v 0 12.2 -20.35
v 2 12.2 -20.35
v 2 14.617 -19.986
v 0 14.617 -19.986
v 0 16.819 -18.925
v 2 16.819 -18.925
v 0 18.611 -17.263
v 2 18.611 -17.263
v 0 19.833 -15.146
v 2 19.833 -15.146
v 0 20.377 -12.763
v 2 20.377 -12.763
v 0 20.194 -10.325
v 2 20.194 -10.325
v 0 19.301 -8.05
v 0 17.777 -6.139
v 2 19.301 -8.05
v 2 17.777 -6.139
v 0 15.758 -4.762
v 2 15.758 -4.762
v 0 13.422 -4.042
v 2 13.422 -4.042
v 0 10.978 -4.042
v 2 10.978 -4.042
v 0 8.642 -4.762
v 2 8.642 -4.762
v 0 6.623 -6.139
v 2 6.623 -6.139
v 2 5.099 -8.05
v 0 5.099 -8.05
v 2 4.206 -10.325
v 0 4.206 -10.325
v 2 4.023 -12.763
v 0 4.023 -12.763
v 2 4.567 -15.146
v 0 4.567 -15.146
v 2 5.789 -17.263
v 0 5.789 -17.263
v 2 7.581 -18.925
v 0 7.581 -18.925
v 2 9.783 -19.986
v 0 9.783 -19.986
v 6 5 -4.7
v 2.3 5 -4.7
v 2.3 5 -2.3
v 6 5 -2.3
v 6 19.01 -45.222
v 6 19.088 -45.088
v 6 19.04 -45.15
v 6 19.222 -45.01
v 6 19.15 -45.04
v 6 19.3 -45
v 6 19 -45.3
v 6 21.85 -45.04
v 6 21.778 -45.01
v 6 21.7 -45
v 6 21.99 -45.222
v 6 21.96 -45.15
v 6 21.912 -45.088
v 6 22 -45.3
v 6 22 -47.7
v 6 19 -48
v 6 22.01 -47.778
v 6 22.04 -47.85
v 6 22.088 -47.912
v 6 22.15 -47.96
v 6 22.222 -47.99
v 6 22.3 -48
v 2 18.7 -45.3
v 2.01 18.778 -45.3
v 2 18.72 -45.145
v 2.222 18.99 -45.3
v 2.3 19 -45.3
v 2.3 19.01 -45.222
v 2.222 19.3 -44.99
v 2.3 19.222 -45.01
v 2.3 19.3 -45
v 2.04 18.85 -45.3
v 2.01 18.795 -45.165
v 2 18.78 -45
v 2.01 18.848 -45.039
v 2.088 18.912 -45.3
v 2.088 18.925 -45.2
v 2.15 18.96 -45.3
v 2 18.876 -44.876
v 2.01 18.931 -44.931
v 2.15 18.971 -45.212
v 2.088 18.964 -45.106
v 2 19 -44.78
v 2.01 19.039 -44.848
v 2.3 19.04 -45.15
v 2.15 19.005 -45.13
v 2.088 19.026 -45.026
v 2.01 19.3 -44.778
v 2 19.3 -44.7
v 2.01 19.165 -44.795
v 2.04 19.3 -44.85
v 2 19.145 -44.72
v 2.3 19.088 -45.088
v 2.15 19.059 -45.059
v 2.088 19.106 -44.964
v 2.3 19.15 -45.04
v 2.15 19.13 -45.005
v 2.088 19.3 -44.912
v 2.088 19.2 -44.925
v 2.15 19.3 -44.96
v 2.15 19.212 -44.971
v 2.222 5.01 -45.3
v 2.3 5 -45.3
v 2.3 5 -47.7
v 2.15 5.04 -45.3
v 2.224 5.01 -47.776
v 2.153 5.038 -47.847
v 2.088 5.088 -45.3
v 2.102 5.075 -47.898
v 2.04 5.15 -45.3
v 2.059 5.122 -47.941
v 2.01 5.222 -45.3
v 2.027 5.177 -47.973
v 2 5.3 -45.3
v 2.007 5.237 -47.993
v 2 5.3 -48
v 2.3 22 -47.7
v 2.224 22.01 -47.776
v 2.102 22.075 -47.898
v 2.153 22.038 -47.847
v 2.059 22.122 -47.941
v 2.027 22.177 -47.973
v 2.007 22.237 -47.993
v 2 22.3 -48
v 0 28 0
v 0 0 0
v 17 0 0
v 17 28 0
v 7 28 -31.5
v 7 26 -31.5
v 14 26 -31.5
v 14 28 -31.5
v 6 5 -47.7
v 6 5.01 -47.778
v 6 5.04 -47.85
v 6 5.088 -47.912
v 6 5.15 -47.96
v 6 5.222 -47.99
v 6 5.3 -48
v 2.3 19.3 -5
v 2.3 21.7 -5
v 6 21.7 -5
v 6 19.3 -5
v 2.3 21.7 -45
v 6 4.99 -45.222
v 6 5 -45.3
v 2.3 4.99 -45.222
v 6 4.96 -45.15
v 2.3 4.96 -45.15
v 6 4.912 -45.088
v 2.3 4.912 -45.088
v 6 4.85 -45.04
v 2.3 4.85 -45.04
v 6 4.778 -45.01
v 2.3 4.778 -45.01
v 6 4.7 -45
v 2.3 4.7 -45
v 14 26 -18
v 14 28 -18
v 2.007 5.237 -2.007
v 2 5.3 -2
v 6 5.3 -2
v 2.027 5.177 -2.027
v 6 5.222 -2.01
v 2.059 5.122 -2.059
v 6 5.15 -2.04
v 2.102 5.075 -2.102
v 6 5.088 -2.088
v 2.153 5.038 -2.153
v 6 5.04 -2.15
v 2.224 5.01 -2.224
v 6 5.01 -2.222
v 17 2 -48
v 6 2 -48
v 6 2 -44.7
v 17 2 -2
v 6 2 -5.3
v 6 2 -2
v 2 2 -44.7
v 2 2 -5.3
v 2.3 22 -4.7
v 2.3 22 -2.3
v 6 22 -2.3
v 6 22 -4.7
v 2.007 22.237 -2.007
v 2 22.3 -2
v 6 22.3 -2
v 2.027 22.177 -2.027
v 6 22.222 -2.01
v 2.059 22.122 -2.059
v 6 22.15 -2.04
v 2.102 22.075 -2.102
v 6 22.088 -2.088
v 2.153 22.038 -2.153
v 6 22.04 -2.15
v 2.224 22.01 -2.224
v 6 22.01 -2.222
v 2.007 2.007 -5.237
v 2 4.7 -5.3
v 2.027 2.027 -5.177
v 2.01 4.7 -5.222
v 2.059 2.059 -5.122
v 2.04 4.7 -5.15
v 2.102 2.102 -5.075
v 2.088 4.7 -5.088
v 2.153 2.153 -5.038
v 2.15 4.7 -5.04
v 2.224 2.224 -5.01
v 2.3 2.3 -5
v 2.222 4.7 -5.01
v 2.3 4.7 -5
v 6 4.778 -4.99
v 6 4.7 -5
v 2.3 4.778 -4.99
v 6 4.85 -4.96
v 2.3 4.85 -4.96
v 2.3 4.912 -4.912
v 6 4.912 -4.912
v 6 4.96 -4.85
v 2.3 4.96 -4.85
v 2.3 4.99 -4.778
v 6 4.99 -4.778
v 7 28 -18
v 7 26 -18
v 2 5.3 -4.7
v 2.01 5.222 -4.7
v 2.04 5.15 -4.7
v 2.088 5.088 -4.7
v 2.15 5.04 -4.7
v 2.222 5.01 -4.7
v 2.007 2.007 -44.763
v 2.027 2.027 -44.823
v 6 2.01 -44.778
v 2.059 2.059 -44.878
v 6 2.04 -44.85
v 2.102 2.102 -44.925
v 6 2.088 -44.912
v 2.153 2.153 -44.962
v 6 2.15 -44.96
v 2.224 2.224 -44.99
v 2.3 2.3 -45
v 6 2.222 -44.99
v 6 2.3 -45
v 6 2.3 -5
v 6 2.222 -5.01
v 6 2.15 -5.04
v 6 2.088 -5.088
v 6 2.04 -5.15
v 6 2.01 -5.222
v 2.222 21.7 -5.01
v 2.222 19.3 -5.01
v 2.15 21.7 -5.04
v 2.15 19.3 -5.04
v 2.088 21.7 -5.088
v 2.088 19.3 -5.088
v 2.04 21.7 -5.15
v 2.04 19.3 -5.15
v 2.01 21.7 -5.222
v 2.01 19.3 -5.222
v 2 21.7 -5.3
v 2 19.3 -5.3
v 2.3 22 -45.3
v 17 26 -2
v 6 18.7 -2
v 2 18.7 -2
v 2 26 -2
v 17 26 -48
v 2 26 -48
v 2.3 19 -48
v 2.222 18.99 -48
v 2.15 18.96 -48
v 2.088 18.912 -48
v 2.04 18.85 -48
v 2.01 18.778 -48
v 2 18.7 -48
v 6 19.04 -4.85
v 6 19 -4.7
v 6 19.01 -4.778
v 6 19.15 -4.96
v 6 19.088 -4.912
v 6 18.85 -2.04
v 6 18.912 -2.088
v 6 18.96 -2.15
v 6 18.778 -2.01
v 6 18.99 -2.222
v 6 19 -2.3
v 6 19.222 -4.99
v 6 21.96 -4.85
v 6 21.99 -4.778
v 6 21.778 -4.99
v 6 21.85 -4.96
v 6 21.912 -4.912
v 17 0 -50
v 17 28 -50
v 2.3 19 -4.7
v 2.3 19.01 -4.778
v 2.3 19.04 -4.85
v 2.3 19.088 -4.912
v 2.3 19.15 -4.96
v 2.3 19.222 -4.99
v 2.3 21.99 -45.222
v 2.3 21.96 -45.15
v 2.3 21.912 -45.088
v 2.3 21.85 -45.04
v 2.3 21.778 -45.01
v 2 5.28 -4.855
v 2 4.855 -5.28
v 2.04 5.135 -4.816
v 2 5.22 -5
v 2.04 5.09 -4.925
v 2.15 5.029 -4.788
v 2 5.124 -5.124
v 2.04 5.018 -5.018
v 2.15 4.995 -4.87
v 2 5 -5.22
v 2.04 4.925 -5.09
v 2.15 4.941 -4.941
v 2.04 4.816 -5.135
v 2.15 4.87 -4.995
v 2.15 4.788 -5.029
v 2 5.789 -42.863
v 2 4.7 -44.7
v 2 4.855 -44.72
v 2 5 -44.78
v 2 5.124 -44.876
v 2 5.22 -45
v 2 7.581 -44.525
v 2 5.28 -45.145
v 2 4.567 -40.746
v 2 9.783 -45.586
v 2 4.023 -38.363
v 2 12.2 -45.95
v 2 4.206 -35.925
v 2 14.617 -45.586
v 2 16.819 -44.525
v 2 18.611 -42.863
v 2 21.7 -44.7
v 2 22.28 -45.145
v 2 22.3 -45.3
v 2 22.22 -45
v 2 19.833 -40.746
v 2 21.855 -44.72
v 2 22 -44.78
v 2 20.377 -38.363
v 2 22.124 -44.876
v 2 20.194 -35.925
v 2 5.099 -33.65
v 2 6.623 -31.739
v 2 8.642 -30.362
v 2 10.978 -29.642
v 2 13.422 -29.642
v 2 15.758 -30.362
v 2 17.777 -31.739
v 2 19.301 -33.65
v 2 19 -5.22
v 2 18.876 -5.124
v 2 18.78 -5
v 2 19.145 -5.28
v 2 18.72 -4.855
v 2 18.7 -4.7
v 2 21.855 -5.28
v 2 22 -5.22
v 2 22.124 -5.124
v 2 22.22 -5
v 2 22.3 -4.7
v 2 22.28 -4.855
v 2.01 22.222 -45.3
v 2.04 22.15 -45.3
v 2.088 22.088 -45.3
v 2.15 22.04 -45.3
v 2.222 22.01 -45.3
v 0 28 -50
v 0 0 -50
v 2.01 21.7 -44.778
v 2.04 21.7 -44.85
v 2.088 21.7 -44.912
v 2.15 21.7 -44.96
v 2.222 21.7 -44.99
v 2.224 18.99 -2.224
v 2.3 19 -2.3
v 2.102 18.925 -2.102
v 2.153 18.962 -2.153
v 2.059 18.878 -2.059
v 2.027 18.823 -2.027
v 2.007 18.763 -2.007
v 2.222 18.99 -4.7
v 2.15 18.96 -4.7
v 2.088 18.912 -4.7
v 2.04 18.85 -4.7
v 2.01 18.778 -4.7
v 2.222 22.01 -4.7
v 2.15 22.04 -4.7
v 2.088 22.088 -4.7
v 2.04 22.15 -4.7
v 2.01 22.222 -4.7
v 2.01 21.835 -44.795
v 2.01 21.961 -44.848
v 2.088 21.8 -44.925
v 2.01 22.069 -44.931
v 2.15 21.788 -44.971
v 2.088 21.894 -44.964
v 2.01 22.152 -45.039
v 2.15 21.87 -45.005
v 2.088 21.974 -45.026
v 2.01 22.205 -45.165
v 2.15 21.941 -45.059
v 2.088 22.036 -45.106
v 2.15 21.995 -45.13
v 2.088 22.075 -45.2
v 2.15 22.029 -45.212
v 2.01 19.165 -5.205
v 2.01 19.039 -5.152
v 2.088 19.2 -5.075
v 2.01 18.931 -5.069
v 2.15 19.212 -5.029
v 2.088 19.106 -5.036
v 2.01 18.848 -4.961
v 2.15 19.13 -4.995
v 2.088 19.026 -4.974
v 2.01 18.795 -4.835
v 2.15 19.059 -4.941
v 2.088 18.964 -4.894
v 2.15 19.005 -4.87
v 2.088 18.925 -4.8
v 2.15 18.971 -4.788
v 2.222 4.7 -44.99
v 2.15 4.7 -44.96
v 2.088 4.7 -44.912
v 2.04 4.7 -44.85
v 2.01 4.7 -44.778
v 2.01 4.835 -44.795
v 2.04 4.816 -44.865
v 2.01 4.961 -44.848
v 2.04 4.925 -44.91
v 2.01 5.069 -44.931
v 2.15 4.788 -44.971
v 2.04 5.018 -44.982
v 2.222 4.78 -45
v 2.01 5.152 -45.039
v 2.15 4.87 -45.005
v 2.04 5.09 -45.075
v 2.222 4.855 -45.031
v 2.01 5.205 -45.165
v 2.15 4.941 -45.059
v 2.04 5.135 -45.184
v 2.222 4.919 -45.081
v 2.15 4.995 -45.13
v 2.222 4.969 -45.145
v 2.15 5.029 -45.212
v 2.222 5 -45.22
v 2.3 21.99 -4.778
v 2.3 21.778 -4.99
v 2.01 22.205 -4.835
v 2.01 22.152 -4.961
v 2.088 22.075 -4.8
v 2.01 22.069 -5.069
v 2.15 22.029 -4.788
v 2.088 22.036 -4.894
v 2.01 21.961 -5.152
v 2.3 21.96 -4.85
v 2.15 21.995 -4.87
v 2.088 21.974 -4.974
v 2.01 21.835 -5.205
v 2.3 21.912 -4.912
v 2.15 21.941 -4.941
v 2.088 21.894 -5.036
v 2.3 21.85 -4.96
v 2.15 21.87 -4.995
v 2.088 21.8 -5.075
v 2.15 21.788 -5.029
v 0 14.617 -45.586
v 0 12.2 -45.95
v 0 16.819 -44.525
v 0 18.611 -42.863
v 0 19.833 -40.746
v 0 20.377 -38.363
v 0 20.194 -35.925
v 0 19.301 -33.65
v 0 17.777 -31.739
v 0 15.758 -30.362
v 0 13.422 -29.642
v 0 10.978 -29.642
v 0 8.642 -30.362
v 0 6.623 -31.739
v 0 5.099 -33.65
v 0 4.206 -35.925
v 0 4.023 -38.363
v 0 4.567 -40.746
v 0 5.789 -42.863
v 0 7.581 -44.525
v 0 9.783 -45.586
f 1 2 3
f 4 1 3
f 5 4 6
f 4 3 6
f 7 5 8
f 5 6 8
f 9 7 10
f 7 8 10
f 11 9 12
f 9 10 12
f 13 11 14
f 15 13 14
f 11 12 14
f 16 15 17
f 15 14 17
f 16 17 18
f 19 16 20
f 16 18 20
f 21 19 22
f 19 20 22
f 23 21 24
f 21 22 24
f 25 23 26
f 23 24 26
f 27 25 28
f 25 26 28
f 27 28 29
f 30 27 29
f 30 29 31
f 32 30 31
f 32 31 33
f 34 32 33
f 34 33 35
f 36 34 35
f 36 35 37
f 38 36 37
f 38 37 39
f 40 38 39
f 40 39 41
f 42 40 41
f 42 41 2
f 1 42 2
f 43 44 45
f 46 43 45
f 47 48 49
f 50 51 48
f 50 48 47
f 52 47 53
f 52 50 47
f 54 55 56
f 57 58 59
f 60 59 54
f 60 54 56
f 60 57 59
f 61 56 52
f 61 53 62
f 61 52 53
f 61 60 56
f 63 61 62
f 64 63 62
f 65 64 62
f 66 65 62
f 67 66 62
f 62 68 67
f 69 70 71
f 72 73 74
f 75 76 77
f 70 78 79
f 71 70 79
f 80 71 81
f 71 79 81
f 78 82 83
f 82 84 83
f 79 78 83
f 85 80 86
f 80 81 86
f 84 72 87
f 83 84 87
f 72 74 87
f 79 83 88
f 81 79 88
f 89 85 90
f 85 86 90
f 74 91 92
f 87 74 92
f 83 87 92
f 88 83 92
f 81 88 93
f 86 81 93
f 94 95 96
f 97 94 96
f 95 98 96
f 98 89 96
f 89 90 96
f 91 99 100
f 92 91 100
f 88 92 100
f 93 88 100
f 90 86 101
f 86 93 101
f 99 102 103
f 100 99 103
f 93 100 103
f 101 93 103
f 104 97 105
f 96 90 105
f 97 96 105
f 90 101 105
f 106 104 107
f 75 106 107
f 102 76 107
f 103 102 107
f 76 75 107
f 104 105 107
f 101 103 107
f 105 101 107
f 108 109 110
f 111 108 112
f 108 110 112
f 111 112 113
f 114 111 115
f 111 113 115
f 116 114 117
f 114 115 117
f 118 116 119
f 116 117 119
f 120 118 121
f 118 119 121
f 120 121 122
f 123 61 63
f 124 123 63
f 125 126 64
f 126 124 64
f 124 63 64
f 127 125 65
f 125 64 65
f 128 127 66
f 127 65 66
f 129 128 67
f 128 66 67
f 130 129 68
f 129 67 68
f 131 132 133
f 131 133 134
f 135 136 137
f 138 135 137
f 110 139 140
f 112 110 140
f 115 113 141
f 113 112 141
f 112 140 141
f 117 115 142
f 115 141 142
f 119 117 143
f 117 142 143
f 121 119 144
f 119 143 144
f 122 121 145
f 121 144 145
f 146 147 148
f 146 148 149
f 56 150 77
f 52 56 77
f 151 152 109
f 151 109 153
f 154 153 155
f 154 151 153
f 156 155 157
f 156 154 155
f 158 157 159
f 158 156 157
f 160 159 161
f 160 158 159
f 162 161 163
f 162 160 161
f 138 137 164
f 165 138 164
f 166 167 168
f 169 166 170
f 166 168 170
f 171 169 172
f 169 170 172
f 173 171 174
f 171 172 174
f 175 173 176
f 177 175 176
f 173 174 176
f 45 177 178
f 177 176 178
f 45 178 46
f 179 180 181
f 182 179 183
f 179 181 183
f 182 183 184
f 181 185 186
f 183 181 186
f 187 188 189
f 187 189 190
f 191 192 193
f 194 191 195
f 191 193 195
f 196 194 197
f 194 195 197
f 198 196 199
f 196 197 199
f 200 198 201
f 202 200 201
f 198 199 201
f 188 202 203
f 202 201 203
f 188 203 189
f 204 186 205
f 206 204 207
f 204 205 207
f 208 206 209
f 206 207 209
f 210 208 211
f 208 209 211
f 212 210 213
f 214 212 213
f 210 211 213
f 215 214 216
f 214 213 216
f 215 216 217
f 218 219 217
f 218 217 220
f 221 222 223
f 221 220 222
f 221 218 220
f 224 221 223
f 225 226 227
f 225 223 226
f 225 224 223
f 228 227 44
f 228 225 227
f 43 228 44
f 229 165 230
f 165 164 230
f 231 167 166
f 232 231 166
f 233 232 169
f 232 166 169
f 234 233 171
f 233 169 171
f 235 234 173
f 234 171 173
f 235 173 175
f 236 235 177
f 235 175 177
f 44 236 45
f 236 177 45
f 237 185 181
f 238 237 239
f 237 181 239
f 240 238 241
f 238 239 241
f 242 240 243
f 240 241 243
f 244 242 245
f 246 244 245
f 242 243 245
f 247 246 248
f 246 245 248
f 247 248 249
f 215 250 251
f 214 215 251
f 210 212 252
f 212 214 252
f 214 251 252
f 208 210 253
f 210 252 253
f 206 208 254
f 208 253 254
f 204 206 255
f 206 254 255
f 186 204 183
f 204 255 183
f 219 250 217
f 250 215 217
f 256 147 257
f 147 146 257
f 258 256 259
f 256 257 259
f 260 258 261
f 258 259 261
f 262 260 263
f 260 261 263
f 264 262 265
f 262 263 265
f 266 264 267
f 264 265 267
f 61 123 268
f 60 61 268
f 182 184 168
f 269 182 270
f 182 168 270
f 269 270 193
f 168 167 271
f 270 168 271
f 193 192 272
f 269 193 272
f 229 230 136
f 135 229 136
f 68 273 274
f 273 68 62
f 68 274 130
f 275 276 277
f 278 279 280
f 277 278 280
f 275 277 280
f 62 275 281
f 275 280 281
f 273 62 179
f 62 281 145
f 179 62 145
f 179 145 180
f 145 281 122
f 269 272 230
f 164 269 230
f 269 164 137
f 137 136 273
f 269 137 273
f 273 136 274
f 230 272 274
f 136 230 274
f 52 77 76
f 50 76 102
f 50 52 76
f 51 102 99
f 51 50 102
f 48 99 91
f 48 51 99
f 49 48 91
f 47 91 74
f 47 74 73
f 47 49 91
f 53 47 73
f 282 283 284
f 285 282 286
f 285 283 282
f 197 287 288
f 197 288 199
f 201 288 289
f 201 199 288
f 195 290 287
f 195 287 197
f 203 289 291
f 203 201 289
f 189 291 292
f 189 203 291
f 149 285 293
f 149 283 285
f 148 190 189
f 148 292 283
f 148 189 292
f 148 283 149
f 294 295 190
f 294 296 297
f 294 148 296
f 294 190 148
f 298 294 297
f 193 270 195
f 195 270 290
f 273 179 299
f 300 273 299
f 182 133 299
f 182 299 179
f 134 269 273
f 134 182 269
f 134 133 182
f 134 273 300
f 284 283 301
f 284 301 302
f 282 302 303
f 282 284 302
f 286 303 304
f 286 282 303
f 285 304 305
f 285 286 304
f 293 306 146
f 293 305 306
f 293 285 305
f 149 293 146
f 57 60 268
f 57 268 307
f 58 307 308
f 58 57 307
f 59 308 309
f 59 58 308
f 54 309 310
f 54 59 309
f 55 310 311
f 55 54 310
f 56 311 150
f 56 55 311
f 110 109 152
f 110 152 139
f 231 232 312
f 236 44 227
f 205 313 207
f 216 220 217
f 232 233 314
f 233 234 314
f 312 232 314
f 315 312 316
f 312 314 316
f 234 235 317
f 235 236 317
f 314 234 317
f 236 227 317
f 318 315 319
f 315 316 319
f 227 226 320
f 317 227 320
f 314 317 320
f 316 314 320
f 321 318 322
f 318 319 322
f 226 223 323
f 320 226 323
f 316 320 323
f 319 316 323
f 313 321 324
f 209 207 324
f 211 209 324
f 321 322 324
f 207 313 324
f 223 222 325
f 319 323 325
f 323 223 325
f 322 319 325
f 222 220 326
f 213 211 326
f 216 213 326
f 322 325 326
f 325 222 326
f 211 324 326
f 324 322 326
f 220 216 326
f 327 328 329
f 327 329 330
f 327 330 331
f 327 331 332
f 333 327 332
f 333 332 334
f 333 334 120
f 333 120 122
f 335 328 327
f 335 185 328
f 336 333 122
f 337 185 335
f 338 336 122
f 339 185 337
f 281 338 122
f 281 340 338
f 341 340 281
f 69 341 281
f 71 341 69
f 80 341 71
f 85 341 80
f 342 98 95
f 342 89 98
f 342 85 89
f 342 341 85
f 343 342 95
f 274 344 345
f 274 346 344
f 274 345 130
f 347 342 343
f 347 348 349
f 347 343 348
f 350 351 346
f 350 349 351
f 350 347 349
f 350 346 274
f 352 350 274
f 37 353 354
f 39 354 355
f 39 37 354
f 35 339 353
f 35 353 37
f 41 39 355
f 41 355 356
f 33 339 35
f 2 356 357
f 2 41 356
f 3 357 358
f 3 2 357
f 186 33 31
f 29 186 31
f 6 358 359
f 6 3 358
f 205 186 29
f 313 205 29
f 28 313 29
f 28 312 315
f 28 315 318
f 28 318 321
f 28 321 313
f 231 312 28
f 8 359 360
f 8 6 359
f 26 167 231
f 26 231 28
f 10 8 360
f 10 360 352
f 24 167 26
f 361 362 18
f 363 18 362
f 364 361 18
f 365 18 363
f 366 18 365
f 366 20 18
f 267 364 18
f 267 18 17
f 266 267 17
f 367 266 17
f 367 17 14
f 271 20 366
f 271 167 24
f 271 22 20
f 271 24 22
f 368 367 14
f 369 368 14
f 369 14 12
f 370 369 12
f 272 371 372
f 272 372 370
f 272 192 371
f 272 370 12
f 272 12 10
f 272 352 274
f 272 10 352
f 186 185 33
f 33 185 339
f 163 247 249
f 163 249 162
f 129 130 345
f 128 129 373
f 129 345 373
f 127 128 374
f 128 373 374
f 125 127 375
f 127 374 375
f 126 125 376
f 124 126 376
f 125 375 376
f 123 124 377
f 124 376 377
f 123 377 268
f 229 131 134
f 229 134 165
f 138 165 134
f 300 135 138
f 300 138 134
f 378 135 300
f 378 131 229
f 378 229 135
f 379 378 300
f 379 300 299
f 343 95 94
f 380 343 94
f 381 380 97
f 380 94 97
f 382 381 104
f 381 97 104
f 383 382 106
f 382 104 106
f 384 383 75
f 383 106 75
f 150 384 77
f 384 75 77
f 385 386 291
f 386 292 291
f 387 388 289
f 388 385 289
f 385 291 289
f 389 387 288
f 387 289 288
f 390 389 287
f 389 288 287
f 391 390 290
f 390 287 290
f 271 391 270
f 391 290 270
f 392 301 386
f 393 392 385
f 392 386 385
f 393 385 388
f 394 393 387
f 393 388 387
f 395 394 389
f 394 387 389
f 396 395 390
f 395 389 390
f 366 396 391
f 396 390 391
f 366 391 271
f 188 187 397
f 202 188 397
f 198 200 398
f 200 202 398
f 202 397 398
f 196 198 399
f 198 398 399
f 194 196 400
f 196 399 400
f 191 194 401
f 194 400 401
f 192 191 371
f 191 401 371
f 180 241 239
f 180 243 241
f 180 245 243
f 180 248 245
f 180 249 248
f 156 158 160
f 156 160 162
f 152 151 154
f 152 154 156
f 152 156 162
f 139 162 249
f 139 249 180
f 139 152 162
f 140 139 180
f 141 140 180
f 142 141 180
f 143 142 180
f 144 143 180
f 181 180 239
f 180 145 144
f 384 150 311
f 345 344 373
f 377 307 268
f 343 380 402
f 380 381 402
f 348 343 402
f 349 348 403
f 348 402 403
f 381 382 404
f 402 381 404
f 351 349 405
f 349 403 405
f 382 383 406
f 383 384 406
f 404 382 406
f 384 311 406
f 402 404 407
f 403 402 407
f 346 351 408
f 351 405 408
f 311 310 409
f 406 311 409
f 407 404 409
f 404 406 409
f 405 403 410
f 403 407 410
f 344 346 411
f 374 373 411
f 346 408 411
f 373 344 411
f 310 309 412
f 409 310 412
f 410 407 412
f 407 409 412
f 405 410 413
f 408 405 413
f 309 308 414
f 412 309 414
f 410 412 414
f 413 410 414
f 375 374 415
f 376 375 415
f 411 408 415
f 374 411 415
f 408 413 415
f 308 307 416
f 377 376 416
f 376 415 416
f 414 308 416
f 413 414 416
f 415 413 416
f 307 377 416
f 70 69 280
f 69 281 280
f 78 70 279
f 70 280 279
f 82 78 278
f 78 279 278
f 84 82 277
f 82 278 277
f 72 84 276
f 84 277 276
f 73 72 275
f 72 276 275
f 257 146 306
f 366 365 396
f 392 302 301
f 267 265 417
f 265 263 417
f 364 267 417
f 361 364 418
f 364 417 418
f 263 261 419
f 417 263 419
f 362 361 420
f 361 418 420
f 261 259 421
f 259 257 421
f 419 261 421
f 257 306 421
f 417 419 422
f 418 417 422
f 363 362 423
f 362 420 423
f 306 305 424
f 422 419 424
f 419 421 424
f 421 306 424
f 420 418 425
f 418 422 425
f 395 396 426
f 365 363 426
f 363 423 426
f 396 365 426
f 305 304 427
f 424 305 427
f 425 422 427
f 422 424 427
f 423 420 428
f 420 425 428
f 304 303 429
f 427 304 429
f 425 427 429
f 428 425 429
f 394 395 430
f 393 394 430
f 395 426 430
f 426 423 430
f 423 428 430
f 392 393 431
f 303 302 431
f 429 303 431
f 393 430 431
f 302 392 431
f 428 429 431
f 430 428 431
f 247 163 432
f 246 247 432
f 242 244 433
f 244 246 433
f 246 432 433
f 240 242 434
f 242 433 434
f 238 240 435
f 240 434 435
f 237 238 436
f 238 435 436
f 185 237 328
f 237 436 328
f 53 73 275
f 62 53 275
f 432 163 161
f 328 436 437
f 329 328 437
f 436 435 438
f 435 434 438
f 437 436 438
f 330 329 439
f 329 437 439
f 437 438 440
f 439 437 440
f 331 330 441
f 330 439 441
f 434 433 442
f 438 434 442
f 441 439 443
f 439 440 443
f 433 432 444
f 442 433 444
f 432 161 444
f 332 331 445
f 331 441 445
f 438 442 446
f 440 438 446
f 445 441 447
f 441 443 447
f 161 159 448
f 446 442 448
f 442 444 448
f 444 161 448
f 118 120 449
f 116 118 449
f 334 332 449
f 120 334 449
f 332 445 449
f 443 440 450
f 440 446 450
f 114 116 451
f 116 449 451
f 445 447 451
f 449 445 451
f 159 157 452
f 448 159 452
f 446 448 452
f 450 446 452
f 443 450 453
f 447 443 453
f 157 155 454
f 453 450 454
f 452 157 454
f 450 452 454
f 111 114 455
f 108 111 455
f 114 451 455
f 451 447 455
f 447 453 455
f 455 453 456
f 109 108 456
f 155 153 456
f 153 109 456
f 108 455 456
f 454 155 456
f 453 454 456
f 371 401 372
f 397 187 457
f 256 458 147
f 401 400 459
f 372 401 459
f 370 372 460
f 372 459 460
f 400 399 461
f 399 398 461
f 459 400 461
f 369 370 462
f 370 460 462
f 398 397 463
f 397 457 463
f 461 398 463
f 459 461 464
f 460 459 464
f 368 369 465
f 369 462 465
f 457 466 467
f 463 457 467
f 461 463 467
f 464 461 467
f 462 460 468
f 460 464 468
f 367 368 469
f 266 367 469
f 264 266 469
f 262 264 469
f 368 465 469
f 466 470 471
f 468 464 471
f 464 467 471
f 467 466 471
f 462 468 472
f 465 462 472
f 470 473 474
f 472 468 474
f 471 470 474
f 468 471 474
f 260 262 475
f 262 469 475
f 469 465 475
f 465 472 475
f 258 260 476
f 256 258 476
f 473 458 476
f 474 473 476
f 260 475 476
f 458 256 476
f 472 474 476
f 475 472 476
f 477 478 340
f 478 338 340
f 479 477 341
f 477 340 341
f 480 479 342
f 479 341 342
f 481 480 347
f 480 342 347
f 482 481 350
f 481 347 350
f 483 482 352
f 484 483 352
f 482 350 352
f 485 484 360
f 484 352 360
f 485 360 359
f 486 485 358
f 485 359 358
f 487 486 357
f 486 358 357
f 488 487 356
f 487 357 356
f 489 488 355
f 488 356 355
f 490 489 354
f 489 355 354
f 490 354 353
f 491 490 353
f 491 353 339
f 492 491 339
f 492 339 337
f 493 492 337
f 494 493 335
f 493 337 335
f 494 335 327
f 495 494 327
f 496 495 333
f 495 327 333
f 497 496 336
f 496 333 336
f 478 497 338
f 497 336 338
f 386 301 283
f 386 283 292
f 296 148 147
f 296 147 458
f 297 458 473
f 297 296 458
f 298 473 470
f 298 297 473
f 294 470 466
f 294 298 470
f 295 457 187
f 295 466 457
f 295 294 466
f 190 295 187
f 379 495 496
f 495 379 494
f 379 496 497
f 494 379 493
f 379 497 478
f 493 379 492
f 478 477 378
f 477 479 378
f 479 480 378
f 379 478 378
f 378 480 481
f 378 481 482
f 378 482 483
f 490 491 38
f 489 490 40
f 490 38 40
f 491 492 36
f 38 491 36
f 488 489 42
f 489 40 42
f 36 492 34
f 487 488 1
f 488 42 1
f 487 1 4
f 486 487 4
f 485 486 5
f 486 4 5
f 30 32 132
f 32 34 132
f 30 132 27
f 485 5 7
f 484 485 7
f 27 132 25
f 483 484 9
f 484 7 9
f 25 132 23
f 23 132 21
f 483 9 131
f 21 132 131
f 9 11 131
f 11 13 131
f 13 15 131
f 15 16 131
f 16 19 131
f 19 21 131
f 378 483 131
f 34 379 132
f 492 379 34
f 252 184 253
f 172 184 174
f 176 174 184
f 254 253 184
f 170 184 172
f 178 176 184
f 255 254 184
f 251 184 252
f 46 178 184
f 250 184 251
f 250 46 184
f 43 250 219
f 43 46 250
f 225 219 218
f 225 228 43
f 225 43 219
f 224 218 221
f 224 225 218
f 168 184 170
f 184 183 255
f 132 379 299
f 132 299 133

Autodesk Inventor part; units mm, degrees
ref_plane "YZ Plane" through (0, 0, 0) normal (1, 0, 0) x (0, 1, 0)
ref_plane "XZ Plane" through (0, 0, 0) normal (0, 1, 0) x (-1, 0, 0)
ref_plane "XY Plane" through (0, 0, 0) normal (0, 0, 1) x (1, 0, 0)
sketch "Skizze1" plane through (0, 0, 0) normal (1, 0, 0) x (0, 1, 0)
  line L0 (0, 0) -> (28, 0)
  line L1 (28, 0) -> (28, -50)
  line L2 (28, -50) -> (0, -50)
  line L3 (0, -50) -> (0, 0)
  dimension "d0" = 28
  dimension "d1" = 50
extrude "Extrusion1" add sketch "Skizze1" along normal blind 17
shell "Wandung1" thickness 2 removed faces 1 at (17, 9.3333, -16.6667)
sketch "Skizze2" plane through (2, 2, -2) normal (1, 0, 0) x (0, 0, -1)
  circle A0 centre (35.75, 10.2) radius 8.2
  circle A1 centre (10.15, 10.2) radius 8.2
  line L0 (46, 0) -> (0, 0) projected
  line L1 (0, 0) -> (0, 24) projected
  point P0 (-2, -2)
  dimension "d5" = 16.4
  dimension "d9" = 25.6
  dimension "d10" = 10.15
  dimension "d11" = 10.2
extrude "Extrusion2" cut sketch "Skizze2" against normal blind 14
sketch "Skizze3" plane through (2, 2, -2) normal (1, 0, 0) x (0, 0, -1)
  line L0 (0, 24) -> (0, 0) projected
  line L1 (0, 0) -> (3, 0)
  line L2 (3, 0) -> (3, 3)
  line L3 (3, 3) -> (0, 3)
  line L4 (0, 3) -> (0, 0)
  line L5 (0, 0) -> (46, 0) projected
  line L6 (46, 0) -> (43, 0)
  line L7 (43, 0) -> (43, 3)
  line L8 (43, 3) -> (46, 3)
  line L9 (46, 3) -> (46, 0)
  line L10 (46, 0) -> (46, 24) projected
  line L11 (46, 20) -> (43, 20)
  line L12 (43, 20) -> (43, 17)
  line L13 (43, 17) -> (46, 17)
  line L14 (46, 17) -> (46, 20)
  line L15 (0, 20) -> (3, 20)
  line L16 (3, 20) -> (3, 17)
  line L17 (3, 17) -> (0, 17)
  line L18 (0, 17) -> (0, 20)
  point P0 (-2, -2)
  point P1 (43, 0)
  point P2 (0, 20)
  point P3 (0, 17)
  dimension "d14" = 3
  dimension "d15" = 3
  dimension "d16" = 3
  dimension "d17" = 3
  dimension "d18" = 3
  dimension "d19" = 20
extrude "Extrusion3" add sketch "Skizze3" along normal blind 4
fillet "Rundung1" radius 0.3 23 edges at (4, 19, -5) (4, 22, -5) (4, 19, -2) (4, 22, -2) (4, 5, -2) (4, 5, -5) (4, 2, -5) (4, 22, -45) (2, 3.5, -45) (2, 5, -46.5) (4, 5, -45) (2, 22, -3.5) (2, 20.5, -5) (2, 5, -3.5) (2, 3.5, -5) (4, 19, -45) (4, 22, -48) (4, 5, -48) (4, 2, -45) (2, 22, -46.5) (2, 20.5, -45) (2, 19, -46.5) (2, 19, -3.5)
sketch "Skizze4" plane through (2, 26, -48) normal (0, -1, 0) x (1, 0, 0)
  line L0 (12, 30) -> (5, 30)
  line L1 (5, 30) -> (5, 16.5)
  line L2 (5, 16.5) -> (12, 16.5)
  line L3 (12, 16.5) -> (12, 30)
  line L4 (4, 43.3) -> (4, 45.7) projected
  line L5 (0, 46) -> (15, 46) projected
  point P0 (-2, 48)
  dimension "d23" = 1
  dimension "d24" = 7
  dimension "d25" = 13.5
  dimension "d26" = 16
extrude "Extrusion4" cut sketch "Skizze4" against normal blind 17
properties part number "gehaeuse_hc-sr04"
